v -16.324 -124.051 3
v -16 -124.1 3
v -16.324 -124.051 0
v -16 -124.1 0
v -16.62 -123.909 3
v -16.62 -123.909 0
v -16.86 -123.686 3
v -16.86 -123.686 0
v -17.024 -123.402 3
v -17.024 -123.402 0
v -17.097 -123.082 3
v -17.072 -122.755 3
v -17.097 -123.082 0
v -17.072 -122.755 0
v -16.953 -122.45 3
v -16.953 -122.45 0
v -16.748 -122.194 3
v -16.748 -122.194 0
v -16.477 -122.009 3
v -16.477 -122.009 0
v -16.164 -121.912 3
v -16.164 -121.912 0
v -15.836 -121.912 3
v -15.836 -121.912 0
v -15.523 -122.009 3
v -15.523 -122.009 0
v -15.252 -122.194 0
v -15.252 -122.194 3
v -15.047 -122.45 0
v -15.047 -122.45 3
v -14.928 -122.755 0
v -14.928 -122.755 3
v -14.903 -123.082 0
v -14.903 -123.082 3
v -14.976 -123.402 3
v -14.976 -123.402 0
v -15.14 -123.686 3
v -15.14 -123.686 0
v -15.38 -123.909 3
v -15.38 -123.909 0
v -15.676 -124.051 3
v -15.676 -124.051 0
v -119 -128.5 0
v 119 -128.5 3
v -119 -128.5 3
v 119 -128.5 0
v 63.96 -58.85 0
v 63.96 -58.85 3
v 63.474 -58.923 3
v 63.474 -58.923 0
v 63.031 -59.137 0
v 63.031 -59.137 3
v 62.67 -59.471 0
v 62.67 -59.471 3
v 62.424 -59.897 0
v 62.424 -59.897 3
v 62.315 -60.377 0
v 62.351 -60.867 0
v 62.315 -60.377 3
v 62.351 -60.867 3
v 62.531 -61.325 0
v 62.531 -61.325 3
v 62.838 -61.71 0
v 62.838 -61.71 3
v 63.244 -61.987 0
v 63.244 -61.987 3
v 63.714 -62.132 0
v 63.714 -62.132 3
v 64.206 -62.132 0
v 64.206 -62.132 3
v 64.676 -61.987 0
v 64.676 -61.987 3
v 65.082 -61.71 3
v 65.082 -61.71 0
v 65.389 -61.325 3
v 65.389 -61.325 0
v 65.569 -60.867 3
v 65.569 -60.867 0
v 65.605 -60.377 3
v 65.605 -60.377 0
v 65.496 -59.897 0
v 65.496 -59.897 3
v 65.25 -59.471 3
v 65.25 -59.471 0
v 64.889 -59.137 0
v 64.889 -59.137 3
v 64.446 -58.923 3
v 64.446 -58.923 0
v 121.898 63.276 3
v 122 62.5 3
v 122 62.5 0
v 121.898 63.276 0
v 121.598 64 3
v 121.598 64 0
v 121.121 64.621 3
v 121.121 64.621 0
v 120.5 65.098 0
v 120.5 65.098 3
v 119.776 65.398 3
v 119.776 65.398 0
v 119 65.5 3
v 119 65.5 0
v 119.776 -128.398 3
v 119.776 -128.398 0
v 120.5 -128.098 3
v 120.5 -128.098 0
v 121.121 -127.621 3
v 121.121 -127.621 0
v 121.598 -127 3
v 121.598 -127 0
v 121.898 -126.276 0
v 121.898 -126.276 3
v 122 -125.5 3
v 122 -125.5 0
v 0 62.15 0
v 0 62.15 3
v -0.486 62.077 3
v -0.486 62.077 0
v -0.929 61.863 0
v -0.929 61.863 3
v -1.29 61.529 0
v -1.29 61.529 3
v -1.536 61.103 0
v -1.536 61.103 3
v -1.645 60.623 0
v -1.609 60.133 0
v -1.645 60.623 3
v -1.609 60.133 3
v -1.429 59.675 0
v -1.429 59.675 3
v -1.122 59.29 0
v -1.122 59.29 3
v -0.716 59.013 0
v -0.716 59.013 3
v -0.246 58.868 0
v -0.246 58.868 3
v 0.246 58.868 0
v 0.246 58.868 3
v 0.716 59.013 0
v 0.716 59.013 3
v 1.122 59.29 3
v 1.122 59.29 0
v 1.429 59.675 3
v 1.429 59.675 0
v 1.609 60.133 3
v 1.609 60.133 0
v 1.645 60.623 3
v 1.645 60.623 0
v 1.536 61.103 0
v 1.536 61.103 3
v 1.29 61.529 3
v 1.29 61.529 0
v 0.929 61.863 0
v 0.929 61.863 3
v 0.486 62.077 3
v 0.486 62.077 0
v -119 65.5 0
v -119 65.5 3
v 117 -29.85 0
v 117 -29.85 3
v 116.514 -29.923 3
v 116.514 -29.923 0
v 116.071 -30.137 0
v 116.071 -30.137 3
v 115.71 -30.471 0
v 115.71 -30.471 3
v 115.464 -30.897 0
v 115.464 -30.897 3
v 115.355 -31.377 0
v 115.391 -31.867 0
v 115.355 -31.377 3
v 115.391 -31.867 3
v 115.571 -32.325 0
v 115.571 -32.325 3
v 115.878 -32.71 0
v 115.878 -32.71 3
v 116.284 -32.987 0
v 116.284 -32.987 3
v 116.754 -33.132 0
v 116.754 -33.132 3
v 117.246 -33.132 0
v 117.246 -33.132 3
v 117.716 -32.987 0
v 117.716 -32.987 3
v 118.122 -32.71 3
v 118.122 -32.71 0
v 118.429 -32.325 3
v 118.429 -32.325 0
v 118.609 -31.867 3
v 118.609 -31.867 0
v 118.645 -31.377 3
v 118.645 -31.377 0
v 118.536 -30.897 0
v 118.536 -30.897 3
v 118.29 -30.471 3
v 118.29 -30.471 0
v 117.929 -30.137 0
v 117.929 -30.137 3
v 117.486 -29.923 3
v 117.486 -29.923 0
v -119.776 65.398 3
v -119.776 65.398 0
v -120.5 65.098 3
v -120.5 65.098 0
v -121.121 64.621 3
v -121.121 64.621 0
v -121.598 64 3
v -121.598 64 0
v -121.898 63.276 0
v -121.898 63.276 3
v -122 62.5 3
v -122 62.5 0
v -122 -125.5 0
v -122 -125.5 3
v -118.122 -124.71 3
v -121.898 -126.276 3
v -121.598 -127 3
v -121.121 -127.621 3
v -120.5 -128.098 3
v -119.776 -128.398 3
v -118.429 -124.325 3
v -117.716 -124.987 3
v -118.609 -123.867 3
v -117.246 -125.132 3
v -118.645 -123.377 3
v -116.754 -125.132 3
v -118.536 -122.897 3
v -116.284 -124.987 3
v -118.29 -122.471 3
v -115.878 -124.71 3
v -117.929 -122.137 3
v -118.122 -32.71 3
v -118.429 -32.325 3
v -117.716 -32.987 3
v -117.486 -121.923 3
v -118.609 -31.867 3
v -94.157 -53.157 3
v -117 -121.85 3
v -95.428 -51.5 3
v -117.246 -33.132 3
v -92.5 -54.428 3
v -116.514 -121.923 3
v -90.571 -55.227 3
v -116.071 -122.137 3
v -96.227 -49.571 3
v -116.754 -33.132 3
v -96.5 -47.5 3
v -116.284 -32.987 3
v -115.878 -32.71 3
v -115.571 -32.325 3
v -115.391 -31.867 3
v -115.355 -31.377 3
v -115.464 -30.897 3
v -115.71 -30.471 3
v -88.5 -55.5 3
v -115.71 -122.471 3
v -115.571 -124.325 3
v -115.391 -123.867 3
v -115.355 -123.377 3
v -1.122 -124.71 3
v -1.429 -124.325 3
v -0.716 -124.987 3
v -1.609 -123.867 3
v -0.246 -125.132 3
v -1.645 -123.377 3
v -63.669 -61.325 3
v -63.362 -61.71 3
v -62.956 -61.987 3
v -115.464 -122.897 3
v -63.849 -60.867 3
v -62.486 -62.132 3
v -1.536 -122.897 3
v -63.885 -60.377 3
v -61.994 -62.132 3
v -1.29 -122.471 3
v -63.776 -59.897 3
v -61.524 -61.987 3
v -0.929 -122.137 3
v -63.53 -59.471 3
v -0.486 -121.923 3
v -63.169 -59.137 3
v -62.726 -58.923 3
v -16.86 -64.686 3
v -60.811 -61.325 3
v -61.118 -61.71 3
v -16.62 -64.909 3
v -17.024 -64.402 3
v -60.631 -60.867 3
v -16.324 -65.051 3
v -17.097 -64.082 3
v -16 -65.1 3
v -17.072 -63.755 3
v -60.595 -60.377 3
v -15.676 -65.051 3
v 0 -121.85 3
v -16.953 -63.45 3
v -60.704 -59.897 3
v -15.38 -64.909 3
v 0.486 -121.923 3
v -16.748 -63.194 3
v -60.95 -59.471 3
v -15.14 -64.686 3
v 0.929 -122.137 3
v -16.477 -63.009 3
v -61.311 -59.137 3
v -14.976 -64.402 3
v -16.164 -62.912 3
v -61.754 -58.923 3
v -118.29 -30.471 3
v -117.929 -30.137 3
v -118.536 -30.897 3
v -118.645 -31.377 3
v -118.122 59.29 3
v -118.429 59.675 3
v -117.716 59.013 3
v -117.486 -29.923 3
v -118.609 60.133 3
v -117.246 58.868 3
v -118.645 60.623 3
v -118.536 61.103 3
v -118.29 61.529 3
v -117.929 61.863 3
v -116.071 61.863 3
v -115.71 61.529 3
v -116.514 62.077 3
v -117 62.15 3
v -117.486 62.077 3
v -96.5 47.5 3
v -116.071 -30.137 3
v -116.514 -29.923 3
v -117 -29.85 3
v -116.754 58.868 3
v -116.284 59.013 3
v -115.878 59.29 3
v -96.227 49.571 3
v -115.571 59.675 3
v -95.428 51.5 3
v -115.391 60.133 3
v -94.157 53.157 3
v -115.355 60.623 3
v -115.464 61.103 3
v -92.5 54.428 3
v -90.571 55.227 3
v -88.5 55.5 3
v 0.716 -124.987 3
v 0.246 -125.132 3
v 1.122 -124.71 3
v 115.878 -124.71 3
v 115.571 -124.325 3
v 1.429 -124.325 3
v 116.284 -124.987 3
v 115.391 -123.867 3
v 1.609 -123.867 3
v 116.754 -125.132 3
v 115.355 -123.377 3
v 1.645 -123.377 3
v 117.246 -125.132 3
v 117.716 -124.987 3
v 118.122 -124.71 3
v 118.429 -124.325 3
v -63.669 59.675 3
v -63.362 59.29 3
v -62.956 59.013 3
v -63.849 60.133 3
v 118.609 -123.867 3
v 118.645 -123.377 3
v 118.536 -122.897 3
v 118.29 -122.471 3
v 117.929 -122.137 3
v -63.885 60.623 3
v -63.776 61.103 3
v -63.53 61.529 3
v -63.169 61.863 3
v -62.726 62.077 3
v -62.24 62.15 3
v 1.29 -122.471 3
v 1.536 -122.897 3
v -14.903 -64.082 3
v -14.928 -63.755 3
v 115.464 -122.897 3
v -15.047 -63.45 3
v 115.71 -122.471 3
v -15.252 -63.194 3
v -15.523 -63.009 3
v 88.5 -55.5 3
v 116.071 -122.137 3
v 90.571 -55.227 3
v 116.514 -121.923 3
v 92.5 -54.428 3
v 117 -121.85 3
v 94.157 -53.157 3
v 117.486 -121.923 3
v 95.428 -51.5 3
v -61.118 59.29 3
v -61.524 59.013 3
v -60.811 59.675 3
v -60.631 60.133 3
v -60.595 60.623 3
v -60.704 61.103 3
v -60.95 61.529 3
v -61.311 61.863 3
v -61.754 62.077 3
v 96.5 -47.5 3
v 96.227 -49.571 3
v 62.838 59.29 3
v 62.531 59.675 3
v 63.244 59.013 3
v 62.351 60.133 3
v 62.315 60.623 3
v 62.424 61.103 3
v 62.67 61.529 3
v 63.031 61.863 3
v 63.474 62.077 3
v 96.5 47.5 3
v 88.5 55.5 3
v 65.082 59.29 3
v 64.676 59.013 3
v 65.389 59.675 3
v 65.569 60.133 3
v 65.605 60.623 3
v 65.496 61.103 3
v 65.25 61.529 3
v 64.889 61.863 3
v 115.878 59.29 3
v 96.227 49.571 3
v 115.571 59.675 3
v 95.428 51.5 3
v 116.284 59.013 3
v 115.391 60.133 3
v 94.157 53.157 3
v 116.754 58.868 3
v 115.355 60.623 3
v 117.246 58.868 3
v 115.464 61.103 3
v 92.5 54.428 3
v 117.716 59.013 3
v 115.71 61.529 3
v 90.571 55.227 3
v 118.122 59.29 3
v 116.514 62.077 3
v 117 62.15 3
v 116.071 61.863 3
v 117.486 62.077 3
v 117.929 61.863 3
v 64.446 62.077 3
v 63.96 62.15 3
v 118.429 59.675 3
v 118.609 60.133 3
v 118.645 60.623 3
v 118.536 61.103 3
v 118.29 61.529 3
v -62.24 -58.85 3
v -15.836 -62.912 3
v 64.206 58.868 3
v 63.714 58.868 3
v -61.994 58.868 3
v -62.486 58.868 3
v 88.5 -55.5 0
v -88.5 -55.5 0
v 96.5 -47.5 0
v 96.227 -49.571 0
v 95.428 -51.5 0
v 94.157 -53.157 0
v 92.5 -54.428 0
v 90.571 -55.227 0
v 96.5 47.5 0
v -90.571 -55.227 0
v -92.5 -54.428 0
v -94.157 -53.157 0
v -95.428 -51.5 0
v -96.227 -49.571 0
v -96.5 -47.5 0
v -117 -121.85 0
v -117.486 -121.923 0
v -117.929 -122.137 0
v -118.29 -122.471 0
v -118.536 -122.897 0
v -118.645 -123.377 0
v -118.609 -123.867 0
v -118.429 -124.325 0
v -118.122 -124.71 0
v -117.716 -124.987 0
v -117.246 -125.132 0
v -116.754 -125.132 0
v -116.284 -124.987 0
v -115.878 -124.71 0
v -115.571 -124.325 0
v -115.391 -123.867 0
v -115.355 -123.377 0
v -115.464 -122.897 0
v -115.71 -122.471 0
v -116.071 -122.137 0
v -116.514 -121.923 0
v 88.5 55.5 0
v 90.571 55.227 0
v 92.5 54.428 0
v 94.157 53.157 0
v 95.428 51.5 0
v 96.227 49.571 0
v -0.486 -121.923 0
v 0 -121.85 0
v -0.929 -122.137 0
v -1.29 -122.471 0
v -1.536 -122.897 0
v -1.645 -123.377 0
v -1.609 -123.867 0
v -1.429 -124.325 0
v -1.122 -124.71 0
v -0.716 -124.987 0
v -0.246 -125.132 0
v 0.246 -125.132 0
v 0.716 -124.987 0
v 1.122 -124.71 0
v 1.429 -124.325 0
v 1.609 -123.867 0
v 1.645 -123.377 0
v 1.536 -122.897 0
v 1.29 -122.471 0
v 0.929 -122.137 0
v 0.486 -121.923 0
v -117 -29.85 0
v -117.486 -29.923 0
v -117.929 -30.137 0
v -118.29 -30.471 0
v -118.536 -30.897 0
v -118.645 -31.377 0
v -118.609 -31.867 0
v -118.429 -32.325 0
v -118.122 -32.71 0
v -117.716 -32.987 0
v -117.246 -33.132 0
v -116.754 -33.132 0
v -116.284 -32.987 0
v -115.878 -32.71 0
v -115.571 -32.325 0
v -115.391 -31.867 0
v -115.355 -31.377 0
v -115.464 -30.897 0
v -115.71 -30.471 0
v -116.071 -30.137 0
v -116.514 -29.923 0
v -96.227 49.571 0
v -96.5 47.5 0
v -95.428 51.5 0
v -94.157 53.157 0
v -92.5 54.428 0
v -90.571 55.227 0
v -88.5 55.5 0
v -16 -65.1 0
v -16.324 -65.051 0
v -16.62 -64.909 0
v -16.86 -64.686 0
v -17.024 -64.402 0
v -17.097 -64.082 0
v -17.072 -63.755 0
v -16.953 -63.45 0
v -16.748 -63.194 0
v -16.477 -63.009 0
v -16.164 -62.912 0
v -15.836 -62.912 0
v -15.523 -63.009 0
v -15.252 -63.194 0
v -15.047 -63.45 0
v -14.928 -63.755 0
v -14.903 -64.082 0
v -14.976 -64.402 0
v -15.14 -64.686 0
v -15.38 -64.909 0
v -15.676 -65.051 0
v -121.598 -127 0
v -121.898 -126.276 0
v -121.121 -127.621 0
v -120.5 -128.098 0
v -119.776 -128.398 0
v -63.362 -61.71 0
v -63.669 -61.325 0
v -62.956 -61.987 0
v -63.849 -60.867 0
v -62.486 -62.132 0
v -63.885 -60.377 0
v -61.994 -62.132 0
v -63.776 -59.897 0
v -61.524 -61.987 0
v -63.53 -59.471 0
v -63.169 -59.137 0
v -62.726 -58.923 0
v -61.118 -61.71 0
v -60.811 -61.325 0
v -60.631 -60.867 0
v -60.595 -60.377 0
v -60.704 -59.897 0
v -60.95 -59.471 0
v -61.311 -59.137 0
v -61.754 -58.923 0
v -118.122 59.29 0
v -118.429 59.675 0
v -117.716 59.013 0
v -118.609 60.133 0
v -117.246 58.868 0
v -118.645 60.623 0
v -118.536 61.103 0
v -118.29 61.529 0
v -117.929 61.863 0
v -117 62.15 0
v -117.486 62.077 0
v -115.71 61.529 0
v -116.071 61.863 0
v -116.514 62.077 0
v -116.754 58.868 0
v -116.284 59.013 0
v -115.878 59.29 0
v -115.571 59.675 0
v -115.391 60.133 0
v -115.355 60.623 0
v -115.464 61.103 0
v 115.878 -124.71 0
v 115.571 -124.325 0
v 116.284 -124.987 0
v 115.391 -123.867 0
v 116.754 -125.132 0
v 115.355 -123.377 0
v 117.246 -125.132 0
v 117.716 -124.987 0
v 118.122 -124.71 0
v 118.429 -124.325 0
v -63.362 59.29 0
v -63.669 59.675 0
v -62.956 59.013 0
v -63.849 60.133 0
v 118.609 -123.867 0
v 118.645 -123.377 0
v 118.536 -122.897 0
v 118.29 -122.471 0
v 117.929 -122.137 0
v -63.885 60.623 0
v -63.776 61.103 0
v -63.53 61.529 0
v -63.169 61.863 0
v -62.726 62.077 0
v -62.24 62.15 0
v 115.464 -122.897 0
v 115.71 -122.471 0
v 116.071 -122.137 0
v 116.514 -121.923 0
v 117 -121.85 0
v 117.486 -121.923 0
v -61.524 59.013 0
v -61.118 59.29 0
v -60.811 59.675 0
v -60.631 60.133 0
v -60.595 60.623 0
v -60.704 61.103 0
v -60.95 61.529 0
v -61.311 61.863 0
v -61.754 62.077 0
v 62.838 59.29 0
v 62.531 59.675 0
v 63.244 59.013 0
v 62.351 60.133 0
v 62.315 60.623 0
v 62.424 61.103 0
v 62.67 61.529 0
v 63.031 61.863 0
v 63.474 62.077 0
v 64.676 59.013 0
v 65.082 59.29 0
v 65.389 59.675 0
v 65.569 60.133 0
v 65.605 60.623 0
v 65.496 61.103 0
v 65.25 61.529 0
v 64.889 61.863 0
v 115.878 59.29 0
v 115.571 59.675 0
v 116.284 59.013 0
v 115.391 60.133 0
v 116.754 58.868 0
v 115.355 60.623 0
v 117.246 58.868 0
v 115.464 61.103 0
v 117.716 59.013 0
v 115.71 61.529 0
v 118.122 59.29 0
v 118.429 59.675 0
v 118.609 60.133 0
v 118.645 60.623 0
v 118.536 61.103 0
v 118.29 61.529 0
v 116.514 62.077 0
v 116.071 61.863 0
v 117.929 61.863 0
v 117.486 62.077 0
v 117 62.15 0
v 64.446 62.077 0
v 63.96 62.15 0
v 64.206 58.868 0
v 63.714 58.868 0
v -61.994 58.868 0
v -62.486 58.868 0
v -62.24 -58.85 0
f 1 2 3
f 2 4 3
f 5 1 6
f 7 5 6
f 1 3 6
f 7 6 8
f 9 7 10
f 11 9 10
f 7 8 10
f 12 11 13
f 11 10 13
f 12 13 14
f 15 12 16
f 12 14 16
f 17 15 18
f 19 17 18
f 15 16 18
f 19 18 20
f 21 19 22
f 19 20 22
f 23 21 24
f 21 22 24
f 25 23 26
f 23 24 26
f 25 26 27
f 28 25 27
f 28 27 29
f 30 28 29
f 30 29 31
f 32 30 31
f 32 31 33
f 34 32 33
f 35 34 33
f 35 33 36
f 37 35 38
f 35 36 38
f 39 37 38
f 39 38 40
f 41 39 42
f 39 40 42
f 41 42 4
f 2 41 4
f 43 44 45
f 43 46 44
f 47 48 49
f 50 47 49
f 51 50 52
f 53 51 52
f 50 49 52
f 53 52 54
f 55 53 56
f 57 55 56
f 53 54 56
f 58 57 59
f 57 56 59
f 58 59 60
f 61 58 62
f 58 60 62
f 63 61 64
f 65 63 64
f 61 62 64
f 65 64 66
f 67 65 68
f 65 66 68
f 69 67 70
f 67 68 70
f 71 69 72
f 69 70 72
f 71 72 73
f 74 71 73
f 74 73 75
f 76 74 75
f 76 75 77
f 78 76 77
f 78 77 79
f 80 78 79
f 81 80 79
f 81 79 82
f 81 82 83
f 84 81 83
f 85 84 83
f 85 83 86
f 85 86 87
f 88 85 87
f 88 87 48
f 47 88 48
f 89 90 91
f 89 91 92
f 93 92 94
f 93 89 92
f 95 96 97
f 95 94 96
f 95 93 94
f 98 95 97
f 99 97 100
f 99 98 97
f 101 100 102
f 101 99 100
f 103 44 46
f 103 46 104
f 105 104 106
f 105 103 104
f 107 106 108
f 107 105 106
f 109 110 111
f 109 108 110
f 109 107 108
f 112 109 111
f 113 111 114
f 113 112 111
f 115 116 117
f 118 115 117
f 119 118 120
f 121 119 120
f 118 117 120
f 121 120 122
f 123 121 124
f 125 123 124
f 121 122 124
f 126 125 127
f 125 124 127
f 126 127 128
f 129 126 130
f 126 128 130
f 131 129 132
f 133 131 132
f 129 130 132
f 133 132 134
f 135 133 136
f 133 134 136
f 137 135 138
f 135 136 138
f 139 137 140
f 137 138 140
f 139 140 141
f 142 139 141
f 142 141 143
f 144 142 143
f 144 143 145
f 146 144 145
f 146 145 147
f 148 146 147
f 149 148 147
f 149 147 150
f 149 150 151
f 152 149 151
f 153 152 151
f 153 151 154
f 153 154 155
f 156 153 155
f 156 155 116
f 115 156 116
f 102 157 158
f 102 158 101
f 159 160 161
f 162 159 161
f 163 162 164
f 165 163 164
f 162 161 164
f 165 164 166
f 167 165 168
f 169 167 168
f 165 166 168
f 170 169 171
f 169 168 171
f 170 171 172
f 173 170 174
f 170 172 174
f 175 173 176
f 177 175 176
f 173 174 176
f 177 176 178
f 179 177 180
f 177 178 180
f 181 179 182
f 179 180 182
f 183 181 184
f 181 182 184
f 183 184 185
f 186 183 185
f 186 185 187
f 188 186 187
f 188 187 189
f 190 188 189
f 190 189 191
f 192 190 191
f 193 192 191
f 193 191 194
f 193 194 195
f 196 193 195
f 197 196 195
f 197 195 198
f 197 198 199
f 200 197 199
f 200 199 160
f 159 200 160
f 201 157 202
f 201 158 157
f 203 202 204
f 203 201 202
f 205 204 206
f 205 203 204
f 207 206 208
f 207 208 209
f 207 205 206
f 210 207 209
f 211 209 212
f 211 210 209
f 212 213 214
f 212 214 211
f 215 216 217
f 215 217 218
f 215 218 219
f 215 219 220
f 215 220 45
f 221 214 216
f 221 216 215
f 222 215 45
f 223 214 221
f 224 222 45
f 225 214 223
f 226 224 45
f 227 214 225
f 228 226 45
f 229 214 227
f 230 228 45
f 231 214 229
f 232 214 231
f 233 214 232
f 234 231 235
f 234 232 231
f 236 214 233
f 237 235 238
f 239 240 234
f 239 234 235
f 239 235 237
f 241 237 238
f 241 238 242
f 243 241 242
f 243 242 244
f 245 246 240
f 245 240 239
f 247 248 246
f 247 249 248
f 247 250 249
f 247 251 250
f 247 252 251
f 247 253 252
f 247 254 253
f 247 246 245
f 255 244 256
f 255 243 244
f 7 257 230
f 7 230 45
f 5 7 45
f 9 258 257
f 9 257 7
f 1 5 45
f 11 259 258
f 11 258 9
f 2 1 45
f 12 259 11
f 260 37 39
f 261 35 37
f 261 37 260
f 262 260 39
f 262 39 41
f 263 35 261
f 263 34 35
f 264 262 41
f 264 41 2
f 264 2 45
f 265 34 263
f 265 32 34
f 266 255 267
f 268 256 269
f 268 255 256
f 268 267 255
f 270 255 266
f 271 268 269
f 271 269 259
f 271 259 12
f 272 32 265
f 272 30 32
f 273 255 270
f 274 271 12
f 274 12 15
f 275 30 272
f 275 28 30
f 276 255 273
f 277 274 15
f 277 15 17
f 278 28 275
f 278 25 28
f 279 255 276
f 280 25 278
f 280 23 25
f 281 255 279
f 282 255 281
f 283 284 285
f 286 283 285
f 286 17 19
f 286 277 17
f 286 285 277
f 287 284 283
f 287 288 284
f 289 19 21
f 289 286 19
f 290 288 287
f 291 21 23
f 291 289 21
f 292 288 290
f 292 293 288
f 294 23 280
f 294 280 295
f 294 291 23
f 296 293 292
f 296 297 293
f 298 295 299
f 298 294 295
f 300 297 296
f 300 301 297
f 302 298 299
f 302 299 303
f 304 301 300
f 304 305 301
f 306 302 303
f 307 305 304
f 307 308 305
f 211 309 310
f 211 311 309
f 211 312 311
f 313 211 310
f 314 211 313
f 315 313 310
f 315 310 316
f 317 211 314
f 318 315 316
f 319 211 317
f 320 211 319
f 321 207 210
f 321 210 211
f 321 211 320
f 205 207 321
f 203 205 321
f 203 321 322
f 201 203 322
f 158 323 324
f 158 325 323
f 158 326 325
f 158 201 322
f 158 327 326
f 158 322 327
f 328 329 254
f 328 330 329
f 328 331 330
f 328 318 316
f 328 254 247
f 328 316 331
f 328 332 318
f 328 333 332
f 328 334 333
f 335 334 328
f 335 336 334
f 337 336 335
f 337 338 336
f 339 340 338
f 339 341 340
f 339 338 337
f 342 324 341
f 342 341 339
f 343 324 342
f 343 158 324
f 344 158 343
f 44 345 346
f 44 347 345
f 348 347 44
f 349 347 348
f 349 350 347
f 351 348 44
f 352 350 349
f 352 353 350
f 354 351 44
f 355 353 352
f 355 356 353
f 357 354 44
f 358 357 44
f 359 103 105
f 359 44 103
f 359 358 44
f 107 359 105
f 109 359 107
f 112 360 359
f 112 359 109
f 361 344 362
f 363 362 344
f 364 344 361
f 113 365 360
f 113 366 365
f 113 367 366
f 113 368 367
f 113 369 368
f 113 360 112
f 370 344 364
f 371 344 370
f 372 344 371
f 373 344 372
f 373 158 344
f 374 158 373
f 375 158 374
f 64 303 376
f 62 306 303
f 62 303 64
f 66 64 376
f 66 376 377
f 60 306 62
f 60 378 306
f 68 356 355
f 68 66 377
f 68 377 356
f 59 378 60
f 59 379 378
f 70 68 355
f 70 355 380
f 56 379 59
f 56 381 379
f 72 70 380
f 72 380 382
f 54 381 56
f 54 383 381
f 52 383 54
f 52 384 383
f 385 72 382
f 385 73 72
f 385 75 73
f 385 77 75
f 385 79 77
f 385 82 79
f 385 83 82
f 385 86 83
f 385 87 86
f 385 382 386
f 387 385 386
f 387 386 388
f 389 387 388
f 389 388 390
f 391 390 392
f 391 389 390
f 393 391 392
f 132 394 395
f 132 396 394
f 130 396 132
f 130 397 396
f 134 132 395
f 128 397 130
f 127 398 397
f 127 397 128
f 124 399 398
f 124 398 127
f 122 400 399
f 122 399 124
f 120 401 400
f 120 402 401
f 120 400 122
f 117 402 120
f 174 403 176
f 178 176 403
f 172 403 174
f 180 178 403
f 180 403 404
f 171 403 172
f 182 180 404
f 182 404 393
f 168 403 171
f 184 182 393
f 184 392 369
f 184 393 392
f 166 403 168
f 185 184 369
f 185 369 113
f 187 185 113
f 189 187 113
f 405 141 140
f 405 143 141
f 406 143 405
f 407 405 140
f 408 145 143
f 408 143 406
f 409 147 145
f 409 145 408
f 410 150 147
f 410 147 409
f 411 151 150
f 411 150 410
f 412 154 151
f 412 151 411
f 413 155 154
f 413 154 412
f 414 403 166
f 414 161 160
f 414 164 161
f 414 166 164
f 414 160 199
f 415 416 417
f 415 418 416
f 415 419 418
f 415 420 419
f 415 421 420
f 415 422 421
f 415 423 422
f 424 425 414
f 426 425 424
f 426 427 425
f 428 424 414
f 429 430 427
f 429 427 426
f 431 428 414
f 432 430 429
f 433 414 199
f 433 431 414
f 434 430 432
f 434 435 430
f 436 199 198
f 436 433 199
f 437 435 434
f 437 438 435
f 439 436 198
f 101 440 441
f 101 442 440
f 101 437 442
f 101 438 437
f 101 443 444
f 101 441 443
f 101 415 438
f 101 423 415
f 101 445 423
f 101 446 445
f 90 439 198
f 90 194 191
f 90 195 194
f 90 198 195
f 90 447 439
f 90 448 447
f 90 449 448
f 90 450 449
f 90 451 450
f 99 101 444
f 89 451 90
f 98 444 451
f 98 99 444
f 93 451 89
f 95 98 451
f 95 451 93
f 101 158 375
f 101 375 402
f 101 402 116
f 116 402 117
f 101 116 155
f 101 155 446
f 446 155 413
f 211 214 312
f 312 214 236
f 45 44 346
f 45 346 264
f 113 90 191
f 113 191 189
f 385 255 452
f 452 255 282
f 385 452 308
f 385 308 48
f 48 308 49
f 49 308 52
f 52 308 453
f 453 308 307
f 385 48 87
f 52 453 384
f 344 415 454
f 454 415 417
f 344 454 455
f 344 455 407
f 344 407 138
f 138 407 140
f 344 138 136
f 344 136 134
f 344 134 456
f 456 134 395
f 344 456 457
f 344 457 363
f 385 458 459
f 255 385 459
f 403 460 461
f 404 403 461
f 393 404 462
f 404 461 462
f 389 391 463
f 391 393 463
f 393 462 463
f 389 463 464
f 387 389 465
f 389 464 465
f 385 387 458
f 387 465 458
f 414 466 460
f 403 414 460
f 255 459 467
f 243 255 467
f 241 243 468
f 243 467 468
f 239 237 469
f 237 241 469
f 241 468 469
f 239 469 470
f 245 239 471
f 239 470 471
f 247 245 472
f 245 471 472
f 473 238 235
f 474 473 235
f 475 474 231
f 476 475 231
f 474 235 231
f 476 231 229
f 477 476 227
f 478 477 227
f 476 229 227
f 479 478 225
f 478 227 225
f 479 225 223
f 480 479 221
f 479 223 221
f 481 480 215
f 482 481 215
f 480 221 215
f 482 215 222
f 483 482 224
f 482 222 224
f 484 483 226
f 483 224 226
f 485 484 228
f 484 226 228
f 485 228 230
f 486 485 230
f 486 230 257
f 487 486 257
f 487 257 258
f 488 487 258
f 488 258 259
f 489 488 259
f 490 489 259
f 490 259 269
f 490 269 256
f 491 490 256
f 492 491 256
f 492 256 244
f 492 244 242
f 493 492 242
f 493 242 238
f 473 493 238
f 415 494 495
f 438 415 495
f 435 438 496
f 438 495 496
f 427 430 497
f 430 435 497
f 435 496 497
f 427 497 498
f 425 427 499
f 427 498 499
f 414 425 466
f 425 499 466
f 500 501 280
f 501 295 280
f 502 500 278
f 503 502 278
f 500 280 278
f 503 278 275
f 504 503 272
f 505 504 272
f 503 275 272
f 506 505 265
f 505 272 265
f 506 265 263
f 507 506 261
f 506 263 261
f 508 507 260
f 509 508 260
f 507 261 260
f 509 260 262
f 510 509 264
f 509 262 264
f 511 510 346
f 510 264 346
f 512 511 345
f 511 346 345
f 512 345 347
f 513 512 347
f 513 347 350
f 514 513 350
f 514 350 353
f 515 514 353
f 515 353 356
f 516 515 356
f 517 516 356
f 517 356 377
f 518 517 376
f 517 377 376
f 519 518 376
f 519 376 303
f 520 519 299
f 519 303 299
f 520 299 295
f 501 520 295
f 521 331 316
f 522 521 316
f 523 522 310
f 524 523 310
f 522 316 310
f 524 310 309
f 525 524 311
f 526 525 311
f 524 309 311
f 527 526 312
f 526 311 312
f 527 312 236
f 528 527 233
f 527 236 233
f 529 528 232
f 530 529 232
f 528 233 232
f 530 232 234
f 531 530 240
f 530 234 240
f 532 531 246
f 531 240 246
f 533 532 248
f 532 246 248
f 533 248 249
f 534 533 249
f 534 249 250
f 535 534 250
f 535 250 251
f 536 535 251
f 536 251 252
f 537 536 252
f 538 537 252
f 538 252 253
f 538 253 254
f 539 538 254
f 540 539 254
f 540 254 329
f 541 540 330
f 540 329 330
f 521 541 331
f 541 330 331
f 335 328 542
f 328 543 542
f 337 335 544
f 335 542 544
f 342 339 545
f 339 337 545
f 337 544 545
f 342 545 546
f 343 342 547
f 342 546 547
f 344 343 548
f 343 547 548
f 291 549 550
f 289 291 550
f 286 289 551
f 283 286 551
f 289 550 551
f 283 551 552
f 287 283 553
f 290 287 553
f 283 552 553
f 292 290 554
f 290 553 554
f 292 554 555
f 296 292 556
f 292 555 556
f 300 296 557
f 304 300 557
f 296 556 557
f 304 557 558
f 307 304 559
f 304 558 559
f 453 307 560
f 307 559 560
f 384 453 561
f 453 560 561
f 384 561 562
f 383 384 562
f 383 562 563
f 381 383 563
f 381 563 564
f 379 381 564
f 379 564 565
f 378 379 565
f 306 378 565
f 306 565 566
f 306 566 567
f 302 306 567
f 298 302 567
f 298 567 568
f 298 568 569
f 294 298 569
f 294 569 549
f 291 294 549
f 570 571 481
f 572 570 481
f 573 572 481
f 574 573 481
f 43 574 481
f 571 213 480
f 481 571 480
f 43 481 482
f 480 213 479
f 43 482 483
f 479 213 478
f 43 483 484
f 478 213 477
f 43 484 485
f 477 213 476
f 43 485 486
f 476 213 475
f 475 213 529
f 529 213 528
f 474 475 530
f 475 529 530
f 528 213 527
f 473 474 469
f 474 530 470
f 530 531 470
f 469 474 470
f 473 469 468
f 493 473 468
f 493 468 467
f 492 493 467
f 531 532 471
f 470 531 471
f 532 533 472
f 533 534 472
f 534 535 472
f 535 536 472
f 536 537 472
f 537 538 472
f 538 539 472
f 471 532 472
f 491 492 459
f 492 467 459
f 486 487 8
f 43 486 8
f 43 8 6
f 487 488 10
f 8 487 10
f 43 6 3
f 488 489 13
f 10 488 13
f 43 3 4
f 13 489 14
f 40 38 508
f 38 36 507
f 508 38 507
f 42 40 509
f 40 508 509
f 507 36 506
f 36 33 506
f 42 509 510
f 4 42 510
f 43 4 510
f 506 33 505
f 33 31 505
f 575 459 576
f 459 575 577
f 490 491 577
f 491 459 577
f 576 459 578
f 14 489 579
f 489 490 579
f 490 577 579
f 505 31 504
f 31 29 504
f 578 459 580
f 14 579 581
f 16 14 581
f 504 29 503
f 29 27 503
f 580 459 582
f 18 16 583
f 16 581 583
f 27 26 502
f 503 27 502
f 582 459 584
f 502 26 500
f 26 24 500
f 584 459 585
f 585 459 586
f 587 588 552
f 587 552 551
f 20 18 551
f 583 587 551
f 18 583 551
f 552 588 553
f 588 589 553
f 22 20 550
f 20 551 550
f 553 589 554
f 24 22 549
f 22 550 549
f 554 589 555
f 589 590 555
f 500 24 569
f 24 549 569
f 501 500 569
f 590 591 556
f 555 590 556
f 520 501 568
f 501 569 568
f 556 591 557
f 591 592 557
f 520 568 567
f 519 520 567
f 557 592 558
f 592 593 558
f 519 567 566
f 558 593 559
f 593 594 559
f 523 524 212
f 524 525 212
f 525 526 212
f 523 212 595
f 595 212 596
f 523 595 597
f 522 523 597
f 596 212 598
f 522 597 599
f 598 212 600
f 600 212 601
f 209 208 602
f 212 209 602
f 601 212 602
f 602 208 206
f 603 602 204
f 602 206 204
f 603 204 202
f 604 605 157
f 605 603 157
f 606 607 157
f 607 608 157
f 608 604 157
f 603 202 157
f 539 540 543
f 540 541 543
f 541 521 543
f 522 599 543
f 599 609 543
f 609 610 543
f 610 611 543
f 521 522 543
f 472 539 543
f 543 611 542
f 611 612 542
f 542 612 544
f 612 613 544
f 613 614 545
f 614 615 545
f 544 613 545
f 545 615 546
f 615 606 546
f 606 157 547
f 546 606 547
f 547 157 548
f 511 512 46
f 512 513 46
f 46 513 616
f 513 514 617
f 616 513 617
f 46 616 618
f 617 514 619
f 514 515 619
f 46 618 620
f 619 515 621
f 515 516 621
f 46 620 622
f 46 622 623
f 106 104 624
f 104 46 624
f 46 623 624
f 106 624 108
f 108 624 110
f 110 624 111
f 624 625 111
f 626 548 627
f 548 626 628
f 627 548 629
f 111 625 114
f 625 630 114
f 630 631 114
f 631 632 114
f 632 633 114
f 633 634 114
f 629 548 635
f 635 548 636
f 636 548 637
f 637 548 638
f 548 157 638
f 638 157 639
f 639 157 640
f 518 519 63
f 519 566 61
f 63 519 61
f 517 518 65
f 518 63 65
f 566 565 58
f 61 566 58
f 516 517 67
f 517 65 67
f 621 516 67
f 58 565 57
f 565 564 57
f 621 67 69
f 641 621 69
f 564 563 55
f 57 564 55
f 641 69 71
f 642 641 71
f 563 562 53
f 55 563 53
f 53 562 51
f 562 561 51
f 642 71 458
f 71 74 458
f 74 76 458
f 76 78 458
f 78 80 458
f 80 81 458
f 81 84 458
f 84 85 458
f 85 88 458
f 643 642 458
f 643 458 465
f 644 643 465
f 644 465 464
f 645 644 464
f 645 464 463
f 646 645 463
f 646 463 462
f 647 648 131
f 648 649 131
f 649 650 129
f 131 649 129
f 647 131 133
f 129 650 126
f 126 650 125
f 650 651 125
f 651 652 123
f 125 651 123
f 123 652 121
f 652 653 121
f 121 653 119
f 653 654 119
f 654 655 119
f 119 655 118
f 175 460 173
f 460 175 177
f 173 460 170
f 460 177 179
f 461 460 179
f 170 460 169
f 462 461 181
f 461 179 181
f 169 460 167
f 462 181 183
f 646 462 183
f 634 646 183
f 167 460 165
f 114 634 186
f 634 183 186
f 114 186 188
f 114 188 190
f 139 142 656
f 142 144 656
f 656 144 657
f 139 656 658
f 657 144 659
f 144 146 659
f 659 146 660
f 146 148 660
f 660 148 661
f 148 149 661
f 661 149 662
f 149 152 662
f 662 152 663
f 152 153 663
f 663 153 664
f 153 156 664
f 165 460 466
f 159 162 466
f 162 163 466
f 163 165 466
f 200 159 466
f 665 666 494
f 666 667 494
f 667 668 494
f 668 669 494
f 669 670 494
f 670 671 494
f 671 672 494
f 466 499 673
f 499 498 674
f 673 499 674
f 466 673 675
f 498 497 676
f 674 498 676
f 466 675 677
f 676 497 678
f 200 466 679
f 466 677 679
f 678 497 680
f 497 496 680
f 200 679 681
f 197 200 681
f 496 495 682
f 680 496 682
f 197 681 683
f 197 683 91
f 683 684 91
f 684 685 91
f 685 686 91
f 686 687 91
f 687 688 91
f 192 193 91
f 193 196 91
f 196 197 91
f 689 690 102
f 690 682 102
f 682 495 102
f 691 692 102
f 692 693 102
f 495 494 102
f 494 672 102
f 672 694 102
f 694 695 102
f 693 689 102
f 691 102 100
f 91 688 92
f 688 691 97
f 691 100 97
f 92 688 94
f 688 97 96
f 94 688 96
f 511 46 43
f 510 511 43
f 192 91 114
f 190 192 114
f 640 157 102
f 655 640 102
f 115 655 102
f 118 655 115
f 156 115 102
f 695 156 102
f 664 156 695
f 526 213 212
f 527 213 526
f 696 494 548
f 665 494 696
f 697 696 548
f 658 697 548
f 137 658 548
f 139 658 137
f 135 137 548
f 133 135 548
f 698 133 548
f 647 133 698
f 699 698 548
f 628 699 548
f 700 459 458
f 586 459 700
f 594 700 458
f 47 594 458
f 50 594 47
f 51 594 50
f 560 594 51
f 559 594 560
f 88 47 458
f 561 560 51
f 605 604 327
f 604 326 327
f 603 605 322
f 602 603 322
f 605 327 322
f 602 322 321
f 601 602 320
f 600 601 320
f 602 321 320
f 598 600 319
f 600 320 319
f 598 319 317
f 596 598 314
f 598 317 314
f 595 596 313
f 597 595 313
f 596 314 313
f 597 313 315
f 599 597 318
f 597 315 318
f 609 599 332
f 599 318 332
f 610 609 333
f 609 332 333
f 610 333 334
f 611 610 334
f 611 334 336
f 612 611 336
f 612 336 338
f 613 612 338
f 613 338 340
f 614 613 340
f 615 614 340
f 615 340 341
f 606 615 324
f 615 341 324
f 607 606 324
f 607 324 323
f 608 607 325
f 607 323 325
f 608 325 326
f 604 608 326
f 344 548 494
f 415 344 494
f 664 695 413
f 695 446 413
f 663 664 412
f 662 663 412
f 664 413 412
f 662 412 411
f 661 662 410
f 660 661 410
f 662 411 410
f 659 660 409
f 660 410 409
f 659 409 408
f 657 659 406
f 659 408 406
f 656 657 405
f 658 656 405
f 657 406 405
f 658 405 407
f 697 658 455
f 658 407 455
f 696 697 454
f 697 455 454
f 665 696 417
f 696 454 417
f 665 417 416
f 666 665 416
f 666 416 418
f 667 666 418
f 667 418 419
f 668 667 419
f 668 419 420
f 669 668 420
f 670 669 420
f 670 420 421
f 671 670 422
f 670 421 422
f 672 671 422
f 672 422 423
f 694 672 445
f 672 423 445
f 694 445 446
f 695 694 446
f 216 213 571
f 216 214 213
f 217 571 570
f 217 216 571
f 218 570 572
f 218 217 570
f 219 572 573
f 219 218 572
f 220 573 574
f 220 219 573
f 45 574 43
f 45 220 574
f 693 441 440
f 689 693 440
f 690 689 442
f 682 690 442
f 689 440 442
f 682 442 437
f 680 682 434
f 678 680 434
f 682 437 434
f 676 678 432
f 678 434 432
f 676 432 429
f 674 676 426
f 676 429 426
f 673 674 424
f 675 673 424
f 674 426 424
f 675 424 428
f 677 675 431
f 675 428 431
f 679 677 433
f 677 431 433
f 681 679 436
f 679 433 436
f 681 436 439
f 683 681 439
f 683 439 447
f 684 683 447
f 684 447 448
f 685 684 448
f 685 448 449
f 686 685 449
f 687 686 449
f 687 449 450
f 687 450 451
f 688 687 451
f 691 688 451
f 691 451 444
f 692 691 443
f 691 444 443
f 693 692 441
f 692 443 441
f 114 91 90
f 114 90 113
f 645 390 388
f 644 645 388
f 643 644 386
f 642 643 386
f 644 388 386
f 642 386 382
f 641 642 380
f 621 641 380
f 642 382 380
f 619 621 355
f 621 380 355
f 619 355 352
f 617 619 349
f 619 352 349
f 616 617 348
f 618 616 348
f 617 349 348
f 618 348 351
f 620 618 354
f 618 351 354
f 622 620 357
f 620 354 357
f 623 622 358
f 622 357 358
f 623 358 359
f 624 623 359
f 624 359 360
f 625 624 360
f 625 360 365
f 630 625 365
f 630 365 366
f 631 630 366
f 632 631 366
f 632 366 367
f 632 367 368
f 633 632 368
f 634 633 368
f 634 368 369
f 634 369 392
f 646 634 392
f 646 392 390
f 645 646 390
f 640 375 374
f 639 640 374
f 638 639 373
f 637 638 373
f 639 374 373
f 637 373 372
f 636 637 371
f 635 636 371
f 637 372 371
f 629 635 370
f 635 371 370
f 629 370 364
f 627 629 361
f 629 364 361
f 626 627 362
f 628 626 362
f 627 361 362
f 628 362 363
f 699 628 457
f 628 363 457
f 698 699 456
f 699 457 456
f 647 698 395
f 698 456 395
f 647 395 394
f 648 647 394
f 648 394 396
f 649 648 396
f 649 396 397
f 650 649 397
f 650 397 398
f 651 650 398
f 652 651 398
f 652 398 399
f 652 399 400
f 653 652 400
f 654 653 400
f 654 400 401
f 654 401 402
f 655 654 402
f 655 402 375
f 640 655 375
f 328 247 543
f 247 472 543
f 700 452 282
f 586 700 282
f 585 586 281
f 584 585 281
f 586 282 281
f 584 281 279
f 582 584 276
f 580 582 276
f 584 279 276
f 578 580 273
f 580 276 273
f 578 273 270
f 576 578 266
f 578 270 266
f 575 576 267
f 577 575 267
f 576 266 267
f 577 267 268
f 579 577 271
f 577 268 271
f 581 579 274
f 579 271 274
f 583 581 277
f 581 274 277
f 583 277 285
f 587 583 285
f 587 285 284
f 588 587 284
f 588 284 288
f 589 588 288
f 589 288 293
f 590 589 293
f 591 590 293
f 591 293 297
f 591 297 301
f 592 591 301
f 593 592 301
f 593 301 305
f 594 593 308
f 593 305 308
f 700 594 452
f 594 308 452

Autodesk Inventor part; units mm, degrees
ref_plane "Plan YZ" through (0, 0, 0) normal (1, 0, 0) x (0, 1, 0)
ref_plane "Plan XZ" through (0, 0, 0) normal (0, 1, 0) x (-1, 0, 0)
ref_plane "Plan XY" through (0, 0, 0) normal (0, 0, 1) x (1, 0, 0)
sketch "Esquisse1" plane through (0, 0, 0) normal (0, 0, 1) x (1, 0, 0)
  line L0 (-88.5, 55.5) -> (88.5, 55.5)
  line L1 (96.5, 47.5) -> (96.5, -47.5)
  line L2 (88.5, -55.5) -> (-88.5, -55.5)
  line L3 (-96.5, -47.5) -> (-96.5, 47.5)
  line L4 (-170.8, 0) -> (170.8, 0) construction
  line L5 (0, -167.3) -> (0, 104.3) construction
  arc A0 (-88.5, 55.5) -> (-96.5, 47.5) centre (-88.5, 47.5) ccw
  arc A1 (-96.5, -47.5) -> (-88.5, -55.5) centre (-88.5, -47.5) ccw
  arc A2 (88.5, -55.5) -> (96.5, -47.5) centre (88.5, -47.5) ccw
  arc A3 (96.5, 47.5) -> (88.5, 55.5) centre (88.5, 47.5) ccw
  line L6 (-83.4, 49.1) -> (86.6, 49.1) construction
  line L7 (86.6, 49.1) -> (86.6, -51.9) construction
  line L8 (86.6, -51.9) -> (-83.4, -51.9) construction
  line L9 (-83.4, -51.9) -> (-83.4, 49.1) construction
  line L10 (88.5, 52.5) -> (-88.5, 52.5)
  arc A4 (-88.5, 52.5) -> (-93.5, 47.5) centre (-88.5, 47.5) ccw
  line L11 (-93.5, 47.5) -> (-93.5, -47.5)
  arc A5 (-93.5, -47.5) -> (-88.5, -52.5) centre (-88.5, -47.5) ccw
  line L12 (-88.5, -52.5) -> (88.5, -52.5)
  arc A6 (88.5, -52.5) -> (93.5, -47.5) centre (88.5, -47.5) ccw
  line L13 (93.5, -47.5) -> (93.5, 47.5)
  arc A7 (93.5, 47.5) -> (88.5, 52.5) centre (88.5, 47.5) ccw
  line L14 (-122, 65.5) -> (122, 65.5)
  line L15 (122, 65.5) -> (122, -128.5)
  line L16 (122, -128.5) -> (-122, -128.5)
  line L17 (-122, -128.5) -> (-122, 65.5)
  line L18 (122, -31.5) -> (-122, -31.5) construction
  point P0 (0, 0)
  point P1 (-96.5, 55.5)
  point P2 (96.5, -55.5)
  point P3 (96.5, 55.5)
  point P4 (-62.24, 33.92)
  point P5 (-62.24, -31.73)
  point P6 (63.96, -31.73)
  point P7 (63.96, 33.92)
  point P8 (-62.24, 60.5)
  point P9 (-62.24, -60.5)
  point P10 (63.96, -60.5)
  point P11 (63.96, 60.5)
  point P12 (-117, -123.5)
  point P13 (0, -123.5)
  point P14 (117, -123.5)
  point P15 (-117, -31.5)
  point P16 (0, -31.5)
  point P17 (117, -31.5)
  point P18 (-117, 60.5)
  point P19 (0, 60.5)
  point P20 (117, 60.5)
  dimension "d0" = 193
  dimension "d1" = 111
  dimension "d2" = 8
  dimension "d3" = 170
  dimension "d4" = 101
  dimension "d6" = 6.4
  dimension "d7" = 9.9
  dimension "d8" = 32.54
  dimension "d9" = 21.58
  dimension "d10" = 126.2
  dimension "d11" = 65.65
  dimension "d12" = 121
  dimension "d13" = 3
  dimension "d14" = 244
  dimension "d15" = 194
  dimension "d39" = 10
  dimension "d42" = 117
  dimension "d45" = 92
extrude "Extrusion1" add sketch "Esquisse1" along normal blind 3 contours L14 L15 L16 L17
hole "Perçage6" at (-62.24, 33.92, 0) at (-62.24, -31.73, 0) at (63.96, -31.73, 0) at (63.96, 33.92, 0) at (-62.24, 60.5, 0) at (-62.24, -60.5, 0) at (63.96, -60.5, 0) at (63.96, 60.5, 0) at (-117, -123.5, 0) at (0, -123.5, 0) at (117, -123.5, 0) at (-117, -31.5, 0) at (0, -31.5, 0) at (117, -31.5, 0) at (-117, 60.5, 0) at (0, 60.5, 0) at (117, 60.5, 0) direction (0, 0, 1) diameter 3.3 end through all
fillet "Congé1" radius 3 4 edges at (122, -128.5, 1.5) (122, 65.5, 1.5) (-122, 65.5, 1.5) (-122, -128.5, 1.5)
sketch "Esquisse9" plane through (0, 0, 3) normal (0, 0, 1) x (1, 0, 0)
  point P0 (0, 0)
  point P1 (-16, -123)
  point P2 (-16, -64)
  dimension "d66" = 59
  dimension "d67" = 64
  dimension "d68" = 16
hole "Perçage4" at (-16, -123, 3) at (-16, -64, 3) direction (0, 0, -1) diameter 2.2 end through all
properties part number "002" material "Plastique PMMA"
